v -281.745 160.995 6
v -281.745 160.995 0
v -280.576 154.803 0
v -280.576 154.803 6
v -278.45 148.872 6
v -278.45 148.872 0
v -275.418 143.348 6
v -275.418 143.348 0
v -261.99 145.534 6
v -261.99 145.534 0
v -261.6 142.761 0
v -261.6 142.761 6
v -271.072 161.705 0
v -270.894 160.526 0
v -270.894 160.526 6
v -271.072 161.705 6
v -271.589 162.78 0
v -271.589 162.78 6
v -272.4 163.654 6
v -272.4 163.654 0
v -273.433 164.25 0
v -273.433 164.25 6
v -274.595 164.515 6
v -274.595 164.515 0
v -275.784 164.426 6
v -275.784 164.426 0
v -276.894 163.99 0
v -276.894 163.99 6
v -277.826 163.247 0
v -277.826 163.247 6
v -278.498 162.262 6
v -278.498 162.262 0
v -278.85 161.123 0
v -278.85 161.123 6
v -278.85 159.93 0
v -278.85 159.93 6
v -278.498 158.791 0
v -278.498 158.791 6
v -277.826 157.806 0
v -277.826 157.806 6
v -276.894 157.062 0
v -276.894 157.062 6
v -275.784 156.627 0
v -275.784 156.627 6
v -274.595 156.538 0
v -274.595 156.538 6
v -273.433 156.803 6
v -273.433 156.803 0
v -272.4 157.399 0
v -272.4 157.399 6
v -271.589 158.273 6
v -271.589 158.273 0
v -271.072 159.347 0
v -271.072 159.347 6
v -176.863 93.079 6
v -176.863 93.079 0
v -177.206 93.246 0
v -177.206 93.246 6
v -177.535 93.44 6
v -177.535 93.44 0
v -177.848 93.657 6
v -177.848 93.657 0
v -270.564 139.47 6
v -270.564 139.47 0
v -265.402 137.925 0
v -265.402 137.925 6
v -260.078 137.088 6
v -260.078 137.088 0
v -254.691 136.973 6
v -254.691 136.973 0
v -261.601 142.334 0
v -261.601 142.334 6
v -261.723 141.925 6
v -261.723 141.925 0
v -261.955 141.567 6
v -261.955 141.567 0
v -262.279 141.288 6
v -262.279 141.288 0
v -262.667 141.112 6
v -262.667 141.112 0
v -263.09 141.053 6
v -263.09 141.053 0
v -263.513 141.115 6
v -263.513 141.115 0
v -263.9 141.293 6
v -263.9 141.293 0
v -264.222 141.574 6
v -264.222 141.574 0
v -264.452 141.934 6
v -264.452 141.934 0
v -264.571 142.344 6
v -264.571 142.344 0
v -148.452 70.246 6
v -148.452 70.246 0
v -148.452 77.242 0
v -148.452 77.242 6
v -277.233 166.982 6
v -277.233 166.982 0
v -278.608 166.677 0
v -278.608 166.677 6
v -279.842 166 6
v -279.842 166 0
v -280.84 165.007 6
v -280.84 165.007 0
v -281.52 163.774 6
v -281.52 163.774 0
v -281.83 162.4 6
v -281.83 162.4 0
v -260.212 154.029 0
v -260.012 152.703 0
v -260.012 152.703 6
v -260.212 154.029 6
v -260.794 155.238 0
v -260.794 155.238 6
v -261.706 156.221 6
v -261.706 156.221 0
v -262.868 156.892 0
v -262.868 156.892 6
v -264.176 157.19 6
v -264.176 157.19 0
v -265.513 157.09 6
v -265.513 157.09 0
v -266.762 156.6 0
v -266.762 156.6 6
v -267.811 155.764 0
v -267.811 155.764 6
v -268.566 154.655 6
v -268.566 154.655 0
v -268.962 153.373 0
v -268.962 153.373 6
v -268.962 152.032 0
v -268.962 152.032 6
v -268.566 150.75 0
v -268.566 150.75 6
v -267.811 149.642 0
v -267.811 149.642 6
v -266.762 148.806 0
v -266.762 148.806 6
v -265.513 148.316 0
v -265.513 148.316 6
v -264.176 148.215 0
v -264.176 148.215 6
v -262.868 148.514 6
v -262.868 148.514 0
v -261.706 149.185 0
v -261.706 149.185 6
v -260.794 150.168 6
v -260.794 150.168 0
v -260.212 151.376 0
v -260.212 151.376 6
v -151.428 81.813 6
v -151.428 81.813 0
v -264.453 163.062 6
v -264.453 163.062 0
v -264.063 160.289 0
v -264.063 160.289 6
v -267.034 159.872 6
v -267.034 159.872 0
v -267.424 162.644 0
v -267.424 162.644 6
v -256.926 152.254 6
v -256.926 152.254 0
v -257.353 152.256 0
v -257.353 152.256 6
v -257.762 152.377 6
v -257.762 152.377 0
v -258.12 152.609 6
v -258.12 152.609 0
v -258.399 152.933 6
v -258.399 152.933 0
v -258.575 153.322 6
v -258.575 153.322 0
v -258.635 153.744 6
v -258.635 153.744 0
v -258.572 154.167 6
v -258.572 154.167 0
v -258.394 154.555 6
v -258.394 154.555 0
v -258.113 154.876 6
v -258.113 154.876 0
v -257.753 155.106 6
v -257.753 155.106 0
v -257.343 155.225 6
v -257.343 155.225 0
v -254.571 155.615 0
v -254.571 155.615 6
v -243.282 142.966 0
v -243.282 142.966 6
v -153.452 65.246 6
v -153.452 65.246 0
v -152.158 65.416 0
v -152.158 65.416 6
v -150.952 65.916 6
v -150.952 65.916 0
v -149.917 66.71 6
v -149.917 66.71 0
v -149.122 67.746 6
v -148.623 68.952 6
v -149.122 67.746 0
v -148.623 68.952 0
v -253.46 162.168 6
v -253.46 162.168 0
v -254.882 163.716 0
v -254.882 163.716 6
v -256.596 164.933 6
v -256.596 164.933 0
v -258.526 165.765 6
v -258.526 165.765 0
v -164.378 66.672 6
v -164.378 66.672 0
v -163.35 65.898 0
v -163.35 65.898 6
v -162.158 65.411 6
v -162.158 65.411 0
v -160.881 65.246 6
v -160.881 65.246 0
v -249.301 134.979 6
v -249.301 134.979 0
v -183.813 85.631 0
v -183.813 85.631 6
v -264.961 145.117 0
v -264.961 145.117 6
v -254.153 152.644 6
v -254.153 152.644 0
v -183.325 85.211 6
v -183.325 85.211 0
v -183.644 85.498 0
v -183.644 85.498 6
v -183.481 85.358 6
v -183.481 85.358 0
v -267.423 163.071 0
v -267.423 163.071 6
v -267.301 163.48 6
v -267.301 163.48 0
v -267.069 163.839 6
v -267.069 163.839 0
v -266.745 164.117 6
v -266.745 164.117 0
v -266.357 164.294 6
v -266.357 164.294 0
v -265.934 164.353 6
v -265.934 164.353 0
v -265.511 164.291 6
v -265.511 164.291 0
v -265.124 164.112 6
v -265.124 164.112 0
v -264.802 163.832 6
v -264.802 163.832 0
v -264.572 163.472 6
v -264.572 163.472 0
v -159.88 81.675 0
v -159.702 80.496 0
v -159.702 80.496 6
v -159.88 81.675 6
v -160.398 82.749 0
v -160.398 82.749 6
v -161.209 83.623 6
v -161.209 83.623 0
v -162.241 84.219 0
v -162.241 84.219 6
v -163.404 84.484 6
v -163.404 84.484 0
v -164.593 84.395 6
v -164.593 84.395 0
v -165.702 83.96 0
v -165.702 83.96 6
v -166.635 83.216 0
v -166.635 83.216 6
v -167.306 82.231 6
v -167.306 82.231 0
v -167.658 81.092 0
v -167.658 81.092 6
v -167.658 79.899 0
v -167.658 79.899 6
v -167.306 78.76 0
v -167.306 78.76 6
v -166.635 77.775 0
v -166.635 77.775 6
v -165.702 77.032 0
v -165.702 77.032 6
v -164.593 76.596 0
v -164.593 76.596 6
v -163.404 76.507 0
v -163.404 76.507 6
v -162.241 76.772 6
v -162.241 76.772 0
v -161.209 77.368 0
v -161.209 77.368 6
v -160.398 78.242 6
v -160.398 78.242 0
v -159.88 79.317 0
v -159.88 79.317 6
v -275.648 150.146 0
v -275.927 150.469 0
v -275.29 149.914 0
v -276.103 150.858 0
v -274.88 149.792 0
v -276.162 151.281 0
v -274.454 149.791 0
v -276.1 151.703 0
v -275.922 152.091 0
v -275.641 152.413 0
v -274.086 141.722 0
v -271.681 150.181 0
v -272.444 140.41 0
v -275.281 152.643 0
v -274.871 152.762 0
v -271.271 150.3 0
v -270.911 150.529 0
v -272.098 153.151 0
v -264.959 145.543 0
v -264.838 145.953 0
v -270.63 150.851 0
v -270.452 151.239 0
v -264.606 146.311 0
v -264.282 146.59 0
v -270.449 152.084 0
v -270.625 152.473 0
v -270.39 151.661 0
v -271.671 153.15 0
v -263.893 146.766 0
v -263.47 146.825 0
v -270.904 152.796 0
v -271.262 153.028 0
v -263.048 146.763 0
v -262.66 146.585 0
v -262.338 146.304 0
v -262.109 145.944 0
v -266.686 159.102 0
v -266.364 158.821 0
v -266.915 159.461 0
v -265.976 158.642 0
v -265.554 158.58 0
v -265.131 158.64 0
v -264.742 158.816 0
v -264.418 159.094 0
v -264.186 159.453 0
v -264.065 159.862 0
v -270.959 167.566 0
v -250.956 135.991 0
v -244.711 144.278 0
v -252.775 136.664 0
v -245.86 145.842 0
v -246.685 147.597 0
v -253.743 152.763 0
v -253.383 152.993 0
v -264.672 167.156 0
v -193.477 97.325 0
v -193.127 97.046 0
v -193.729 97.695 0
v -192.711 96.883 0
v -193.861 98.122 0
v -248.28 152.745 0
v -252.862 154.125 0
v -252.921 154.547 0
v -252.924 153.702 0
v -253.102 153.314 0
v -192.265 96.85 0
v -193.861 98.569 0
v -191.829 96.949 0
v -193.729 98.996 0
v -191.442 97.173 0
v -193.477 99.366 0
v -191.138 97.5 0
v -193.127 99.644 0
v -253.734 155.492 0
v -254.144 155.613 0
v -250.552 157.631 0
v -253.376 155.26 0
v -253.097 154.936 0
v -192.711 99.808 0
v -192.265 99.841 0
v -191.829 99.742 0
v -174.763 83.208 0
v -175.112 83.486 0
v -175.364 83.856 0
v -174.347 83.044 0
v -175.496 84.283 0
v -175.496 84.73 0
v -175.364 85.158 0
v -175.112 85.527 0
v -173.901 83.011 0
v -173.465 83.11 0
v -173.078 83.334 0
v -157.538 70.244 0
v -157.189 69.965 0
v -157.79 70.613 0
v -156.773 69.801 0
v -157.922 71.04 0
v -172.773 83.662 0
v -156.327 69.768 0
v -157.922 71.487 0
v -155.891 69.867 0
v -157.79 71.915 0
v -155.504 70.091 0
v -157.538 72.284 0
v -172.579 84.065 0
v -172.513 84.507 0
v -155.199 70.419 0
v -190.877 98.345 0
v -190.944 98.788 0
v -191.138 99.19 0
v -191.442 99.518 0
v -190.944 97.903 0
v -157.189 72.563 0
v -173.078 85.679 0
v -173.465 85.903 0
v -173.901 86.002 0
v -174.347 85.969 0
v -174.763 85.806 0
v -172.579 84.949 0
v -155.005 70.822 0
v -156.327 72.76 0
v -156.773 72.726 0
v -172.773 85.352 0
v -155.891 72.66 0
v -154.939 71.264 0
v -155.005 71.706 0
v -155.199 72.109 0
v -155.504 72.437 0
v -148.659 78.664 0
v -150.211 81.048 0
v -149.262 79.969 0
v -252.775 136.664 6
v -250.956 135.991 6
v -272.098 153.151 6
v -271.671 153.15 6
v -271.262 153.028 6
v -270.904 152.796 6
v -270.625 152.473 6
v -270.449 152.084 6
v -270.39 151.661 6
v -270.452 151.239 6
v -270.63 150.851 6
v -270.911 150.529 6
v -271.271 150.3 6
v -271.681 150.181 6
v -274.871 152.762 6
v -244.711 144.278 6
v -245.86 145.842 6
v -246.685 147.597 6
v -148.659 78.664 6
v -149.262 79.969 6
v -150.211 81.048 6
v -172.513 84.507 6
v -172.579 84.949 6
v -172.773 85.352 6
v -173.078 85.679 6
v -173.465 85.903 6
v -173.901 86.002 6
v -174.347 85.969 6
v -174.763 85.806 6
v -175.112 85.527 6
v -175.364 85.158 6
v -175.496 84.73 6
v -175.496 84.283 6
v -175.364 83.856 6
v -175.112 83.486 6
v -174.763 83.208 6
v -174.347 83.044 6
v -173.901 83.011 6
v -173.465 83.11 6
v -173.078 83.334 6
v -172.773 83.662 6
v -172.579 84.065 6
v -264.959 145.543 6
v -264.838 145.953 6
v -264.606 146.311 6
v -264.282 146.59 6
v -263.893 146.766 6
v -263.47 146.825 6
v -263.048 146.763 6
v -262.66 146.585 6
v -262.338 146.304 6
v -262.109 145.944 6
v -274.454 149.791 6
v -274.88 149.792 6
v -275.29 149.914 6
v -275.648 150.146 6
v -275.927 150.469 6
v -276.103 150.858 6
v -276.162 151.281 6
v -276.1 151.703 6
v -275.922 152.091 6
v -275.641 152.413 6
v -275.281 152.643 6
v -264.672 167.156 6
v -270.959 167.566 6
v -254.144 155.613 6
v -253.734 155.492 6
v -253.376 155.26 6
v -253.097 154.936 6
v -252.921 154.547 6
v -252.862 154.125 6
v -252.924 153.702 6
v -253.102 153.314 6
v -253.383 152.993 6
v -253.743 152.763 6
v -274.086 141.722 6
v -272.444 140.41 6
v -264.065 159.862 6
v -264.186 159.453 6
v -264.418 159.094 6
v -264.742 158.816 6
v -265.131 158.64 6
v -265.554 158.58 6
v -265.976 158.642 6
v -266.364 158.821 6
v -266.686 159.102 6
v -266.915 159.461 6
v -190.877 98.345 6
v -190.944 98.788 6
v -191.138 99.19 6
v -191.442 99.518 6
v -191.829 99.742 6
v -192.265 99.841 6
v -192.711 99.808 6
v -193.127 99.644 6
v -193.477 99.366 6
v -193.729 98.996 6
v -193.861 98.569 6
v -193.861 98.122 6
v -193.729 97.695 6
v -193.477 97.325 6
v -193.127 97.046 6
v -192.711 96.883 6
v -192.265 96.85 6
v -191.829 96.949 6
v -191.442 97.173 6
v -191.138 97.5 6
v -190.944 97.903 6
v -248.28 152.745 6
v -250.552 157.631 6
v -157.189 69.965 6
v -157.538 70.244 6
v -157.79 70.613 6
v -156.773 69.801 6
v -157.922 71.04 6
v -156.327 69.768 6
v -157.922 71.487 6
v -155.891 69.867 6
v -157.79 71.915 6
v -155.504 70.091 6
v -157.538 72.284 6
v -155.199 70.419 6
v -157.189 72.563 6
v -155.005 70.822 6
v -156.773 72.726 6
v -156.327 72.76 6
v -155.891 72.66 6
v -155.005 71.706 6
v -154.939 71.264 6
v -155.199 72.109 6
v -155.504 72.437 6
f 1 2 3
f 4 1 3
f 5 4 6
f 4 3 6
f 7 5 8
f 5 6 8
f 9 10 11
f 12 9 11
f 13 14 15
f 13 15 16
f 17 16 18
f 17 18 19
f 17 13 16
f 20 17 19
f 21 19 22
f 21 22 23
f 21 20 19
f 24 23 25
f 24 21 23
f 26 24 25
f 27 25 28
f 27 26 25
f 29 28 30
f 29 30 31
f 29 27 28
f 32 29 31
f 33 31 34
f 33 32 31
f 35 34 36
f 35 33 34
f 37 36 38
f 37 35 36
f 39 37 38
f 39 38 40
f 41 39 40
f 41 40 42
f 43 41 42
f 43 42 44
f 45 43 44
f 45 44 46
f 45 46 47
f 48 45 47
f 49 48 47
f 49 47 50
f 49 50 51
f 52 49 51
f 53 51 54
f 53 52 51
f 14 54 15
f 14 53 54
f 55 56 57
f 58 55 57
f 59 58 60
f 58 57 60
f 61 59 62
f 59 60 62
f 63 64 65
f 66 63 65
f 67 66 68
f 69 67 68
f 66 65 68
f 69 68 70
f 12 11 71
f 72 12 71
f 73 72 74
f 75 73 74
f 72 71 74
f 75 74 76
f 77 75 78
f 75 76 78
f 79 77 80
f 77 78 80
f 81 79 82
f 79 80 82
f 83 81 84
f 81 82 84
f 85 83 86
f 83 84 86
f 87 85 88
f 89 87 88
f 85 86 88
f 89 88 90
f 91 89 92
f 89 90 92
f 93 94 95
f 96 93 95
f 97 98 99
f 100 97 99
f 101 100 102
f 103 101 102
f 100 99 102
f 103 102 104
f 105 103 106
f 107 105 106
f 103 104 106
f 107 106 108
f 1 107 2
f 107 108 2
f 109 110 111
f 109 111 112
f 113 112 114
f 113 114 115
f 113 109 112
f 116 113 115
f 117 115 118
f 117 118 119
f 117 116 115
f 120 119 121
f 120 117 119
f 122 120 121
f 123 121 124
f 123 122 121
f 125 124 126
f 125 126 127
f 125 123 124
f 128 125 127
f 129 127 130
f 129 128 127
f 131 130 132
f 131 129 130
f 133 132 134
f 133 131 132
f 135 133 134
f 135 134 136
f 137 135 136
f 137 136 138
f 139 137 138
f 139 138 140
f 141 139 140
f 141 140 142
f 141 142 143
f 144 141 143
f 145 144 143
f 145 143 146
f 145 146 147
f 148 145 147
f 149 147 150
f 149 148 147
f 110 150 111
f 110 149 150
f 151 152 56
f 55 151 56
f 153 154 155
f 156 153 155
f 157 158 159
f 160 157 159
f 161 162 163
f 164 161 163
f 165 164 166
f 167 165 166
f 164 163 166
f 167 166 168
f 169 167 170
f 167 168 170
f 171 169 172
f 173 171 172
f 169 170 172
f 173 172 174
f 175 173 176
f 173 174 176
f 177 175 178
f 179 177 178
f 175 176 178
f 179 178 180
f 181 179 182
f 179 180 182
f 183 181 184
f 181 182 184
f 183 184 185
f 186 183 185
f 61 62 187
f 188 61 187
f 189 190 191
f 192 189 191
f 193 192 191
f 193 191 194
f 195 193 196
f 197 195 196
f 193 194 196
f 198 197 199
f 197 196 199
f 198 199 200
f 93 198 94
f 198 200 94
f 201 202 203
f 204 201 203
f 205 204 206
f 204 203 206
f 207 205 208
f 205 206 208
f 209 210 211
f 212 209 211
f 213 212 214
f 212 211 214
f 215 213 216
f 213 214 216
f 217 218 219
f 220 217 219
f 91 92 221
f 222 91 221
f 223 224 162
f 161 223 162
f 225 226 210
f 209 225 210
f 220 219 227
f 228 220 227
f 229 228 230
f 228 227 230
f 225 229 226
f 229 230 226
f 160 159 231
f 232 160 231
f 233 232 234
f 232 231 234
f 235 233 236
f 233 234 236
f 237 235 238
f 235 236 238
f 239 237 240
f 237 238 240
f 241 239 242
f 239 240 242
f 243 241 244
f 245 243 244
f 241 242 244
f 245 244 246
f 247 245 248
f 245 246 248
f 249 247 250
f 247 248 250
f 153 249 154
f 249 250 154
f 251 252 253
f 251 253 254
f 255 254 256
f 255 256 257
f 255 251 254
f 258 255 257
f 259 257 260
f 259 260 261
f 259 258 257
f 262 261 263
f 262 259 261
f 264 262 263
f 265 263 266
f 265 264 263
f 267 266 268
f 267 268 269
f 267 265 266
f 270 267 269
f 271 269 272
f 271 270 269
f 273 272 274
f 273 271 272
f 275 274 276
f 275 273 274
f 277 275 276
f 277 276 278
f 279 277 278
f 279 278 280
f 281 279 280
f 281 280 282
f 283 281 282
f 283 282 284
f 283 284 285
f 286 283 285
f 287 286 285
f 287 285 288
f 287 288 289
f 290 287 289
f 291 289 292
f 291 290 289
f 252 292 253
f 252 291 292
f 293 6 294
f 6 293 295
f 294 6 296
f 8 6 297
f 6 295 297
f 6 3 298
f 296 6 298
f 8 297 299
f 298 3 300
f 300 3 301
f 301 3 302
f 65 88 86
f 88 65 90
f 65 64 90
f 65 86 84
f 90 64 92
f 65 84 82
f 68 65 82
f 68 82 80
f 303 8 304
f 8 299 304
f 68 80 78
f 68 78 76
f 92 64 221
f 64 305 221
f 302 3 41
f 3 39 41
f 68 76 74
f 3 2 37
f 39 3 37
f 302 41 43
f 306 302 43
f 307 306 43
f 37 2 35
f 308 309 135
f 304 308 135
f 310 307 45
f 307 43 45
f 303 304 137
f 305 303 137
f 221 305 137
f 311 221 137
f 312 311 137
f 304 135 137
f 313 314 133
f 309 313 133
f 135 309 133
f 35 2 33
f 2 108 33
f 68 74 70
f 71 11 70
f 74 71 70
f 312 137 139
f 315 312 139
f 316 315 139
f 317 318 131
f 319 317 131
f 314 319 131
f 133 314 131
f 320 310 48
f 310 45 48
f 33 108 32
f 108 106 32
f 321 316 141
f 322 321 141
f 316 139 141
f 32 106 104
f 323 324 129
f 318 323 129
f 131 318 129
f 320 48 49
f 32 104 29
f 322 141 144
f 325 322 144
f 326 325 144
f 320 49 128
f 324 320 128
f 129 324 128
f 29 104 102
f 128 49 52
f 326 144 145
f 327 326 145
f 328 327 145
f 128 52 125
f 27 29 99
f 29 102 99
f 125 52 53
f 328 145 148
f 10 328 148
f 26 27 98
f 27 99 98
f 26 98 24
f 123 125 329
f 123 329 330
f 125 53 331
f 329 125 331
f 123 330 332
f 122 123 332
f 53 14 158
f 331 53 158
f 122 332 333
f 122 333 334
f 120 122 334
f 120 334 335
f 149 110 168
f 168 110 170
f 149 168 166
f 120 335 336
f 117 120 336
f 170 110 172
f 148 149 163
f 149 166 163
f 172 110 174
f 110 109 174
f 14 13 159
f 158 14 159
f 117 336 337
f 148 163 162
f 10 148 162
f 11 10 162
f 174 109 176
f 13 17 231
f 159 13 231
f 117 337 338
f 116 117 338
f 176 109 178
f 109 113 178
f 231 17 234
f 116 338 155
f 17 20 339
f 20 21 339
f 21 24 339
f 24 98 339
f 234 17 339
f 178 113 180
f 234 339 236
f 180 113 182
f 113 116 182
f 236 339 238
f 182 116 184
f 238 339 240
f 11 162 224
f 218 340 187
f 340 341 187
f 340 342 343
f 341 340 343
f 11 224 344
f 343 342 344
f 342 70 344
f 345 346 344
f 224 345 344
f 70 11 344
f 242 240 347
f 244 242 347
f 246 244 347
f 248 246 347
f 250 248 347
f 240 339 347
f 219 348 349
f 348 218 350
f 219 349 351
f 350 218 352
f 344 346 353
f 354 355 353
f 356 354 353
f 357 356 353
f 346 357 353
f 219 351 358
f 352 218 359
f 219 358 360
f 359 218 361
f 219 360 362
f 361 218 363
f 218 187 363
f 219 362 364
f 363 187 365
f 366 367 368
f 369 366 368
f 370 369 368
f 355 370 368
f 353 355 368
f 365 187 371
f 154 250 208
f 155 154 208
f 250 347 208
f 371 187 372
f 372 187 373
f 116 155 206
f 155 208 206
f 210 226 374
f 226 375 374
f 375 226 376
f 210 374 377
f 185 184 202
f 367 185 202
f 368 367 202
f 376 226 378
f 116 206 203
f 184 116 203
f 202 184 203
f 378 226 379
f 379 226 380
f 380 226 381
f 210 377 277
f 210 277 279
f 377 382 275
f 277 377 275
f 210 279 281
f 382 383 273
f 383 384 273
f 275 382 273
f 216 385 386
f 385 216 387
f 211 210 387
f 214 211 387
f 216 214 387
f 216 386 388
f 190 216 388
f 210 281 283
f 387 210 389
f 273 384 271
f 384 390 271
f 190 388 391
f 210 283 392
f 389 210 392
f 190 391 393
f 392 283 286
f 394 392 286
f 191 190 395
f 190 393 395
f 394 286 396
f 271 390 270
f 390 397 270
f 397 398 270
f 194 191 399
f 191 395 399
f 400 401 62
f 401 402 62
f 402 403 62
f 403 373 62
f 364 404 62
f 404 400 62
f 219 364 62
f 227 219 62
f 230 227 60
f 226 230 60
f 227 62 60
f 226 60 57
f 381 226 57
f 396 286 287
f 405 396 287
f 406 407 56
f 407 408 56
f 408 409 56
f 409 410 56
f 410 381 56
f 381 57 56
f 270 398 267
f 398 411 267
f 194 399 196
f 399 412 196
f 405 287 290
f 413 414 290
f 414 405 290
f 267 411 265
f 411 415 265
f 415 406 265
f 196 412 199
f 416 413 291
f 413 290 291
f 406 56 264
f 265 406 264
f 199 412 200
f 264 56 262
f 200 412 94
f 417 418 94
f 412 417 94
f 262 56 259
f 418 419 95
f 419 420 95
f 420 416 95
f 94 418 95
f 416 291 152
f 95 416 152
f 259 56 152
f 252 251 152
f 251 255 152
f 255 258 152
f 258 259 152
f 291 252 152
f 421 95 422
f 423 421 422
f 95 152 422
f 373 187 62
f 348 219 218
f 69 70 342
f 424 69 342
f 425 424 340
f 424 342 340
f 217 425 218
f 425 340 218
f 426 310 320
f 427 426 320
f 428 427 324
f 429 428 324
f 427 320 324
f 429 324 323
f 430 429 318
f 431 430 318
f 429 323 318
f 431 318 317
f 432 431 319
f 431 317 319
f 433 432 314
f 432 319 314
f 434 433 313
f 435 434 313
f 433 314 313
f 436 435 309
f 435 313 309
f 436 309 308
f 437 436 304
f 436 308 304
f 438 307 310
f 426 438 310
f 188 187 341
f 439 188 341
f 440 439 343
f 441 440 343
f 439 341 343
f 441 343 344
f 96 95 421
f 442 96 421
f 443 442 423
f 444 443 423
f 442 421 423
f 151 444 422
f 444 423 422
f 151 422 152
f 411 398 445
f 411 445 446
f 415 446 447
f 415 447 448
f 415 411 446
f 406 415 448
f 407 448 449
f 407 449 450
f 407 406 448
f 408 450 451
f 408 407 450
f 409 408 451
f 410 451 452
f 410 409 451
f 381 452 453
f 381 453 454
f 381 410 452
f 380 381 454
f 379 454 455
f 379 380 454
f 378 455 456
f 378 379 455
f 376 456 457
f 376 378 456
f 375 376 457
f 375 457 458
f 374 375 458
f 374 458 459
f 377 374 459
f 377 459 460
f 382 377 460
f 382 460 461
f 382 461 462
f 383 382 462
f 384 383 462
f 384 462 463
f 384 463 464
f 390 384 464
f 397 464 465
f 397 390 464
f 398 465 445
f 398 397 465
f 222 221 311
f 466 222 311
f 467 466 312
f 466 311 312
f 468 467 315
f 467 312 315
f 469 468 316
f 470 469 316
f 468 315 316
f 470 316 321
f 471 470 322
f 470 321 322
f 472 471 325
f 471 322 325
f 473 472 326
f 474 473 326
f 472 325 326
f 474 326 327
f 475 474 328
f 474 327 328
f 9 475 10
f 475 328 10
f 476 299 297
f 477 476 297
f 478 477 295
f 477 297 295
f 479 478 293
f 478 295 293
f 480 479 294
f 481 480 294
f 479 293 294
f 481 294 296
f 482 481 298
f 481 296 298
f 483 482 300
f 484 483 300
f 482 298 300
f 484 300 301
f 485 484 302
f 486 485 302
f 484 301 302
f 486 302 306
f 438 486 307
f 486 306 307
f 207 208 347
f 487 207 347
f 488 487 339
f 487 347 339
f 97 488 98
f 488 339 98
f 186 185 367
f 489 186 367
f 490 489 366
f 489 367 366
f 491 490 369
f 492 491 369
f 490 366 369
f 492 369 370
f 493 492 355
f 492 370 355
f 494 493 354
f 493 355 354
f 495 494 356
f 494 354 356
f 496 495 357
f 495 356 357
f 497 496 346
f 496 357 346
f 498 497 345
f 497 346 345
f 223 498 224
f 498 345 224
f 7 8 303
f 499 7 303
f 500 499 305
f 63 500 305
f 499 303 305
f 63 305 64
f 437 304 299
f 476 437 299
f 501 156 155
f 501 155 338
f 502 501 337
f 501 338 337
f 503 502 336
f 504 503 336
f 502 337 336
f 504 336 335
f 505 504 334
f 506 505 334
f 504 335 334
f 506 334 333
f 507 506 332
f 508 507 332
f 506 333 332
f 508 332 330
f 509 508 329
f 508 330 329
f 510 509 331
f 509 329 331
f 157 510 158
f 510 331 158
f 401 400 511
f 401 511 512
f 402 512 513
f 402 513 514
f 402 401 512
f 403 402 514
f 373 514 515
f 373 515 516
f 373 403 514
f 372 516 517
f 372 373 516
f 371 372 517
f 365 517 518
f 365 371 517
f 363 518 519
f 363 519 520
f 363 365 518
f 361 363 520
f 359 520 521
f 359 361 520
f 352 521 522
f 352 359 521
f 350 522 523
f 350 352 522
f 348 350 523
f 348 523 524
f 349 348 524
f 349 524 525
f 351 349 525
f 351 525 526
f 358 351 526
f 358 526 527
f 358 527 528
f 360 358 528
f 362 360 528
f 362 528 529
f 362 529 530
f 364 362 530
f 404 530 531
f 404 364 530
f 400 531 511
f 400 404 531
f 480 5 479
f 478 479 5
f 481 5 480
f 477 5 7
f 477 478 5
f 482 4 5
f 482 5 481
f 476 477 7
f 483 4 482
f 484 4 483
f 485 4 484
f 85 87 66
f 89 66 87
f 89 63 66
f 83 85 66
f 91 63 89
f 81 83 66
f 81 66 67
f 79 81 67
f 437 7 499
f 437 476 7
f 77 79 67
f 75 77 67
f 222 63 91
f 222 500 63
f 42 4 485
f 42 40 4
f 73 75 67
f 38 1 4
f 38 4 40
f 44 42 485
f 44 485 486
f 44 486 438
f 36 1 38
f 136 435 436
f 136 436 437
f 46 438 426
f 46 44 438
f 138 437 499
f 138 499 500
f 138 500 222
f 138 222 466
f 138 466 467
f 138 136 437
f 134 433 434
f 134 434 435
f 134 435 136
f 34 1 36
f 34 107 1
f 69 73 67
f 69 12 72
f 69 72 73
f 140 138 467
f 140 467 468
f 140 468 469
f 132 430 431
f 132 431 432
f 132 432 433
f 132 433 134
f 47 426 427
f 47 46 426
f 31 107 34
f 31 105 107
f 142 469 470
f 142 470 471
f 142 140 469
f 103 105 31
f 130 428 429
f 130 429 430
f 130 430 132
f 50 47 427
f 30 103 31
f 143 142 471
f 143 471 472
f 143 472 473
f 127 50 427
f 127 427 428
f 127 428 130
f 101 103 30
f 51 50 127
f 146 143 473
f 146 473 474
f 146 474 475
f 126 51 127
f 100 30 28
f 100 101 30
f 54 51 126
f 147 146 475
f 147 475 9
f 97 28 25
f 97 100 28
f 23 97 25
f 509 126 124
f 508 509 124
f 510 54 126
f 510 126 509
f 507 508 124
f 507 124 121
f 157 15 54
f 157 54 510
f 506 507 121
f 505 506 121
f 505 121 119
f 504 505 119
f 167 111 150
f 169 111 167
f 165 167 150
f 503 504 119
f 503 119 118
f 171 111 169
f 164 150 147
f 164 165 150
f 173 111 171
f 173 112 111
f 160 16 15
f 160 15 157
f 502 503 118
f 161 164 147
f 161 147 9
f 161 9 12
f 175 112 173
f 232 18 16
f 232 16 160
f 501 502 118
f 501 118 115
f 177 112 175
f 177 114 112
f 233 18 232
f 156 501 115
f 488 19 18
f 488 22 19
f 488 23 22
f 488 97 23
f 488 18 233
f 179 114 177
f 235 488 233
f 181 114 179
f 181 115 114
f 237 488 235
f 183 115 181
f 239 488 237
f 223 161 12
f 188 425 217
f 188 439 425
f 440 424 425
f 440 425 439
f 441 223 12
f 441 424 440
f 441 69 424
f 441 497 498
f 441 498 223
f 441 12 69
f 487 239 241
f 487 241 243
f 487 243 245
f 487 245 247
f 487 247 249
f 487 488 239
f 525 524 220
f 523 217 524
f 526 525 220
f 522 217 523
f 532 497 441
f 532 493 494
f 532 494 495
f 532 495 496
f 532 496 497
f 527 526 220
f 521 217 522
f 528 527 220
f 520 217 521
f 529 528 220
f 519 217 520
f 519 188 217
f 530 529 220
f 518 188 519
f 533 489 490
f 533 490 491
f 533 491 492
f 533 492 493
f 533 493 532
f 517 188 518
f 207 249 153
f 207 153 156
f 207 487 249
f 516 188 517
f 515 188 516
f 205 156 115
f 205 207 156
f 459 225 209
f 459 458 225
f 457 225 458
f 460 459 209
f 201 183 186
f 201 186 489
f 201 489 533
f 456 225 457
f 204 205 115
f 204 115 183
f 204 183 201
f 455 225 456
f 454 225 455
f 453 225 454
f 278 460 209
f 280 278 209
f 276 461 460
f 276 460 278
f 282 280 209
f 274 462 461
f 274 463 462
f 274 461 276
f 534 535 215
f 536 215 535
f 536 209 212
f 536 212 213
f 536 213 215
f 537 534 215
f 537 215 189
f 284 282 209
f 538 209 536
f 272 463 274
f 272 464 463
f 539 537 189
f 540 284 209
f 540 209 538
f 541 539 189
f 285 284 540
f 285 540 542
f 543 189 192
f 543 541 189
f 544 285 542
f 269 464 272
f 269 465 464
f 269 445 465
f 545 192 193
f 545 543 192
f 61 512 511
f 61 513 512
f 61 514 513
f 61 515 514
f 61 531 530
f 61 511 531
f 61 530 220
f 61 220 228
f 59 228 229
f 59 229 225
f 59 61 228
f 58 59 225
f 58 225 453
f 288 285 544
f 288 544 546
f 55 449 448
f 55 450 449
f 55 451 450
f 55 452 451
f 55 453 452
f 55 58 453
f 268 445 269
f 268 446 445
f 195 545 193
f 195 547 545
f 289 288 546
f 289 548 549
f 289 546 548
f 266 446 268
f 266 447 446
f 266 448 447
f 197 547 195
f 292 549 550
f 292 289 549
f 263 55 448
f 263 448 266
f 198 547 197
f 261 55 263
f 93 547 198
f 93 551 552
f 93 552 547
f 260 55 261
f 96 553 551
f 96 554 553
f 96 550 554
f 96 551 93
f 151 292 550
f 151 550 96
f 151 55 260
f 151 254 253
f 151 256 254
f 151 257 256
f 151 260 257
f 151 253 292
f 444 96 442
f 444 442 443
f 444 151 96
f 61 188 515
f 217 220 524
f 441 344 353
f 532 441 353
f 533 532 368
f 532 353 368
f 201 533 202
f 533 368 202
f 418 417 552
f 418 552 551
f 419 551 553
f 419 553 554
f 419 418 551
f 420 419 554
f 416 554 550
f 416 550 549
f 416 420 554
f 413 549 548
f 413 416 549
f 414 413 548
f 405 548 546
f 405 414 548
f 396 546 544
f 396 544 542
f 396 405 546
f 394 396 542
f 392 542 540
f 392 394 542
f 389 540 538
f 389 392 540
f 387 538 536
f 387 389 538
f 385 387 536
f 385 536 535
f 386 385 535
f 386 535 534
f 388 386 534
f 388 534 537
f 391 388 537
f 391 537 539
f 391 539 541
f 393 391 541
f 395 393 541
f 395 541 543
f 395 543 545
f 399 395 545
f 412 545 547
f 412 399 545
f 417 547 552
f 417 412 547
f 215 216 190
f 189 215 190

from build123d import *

# Parameters (mm, degrees)
CROQUIS1_R              = 1.5
CROQUIS1_R_2            = 4
CROQUIS1_R_3            = 4.5
SALIENTE_EXTRUIR1_DEPTH = 6


with BuildPart() as part:
    # Croquis1 → Saliente-Extruir1 (new body)
    with BuildSketch(Plane.XY):
        with BuildLine():
            ThreePointArc((-153.452479084, 65.245629882), (-149.916945178, 66.710095976), (-148.452479084, 70.245629882))
            Line((-148.452479084, 70.245629882), (-148.452479084, 77.241660705))
            ThreePointArc((-148.452479084, 77.241660705), (-149.261781775, 79.96894068), (-151.427701509, 81.813342646))
            Line((-151.427701509, 81.813342646), (-176.86343393, 93.078715272))
            ThreePointArc((-176.86343393, 93.078715272), (-177.372149016, 93.339780675), (-177.847731471, 93.657219664))
            Line((-177.847731471, 93.657219663), (-243.282498112, 142.965853083))
            ThreePointArc((-243.282498112, 142.965853083), (-245.323514753, 145.031918552), (-246.684791002, 147.597323475))
            ThreePointArc((-246.684791002, 147.597323475), (-249.33333249, 155.226277836), (-253.46024382, 162.167770437))
            ThreePointArc((-253.46024382, 162.167770437), (-255.706791789, 164.36963499), (-258.526200935, 165.764668091))
            ThreePointArc((-258.526200935, 165.764668091), (-267.807267276, 167.484933762), (-277.233031605, 166.98246665))
            ThreePointArc((-277.233031605, 166.98246665), (-280.839635864, 165.006508056), (-281.744934312, 160.994969527))
            ThreePointArc((-281.744934312, 160.994969527), (-279.629843944, 151.795844616), (-275.418009863, 143.348480526))
            ThreePointArc((-275.418009863, 143.348480526), (-273.299883496, 141.022813744), (-270.564082899, 139.470209357))
            ThreePointArc((-270.564082899, 139.470209357), (-262.753961023, 137.416502238), (-254.690502443, 136.973385563))
            ThreePointArc((-254.690502443, 136.973385563), (-251.84925837, 136.371964278), (-249.300648344, 134.979497983))
            Line((-249.300648344, 134.979497983), (-183.81253652, 85.630666085))
            ThreePointArc((-183.81253652, 85.630666085), (-183.561856018, 85.428793496), (-183.324683063, 85.211210762))
            Line((-183.324683063, 85.211210762), (-164.378251009, 66.671907655))
            ThreePointArc((-164.378251009, 66.671907655), (-162.769627082, 65.615910067), (-160.881322437, 65.245629882))
            Line((-160.881322437, 65.245629882), (-153.452479084, 65.245629882))
        make_face()
        with Locations((-156.438834184, 71.263780114)):
            Circle(CROQUIS1_R, mode=Mode.SUBTRACT)
        with Locations((-174.012762489, 84.506684964)):
            Circle(CROQUIS1_R, mode=Mode.SUBTRACT)
        with Locations((-163.702479084, 80.495629882)):
            Circle(CROQUIS1_R_2, mode=Mode.SUBTRACT)
        with Locations((-192.377432136, 98.345456156)):
            Circle(CROQUIS1_R, mode=Mode.SUBTRACT)
        with BuildLine():
            Line((-271.680758131, 150.180525793), (-274.453508724, 149.79084111))
            ThreePointArc((-274.453508724, 149.79084111), (-276.147670478, 151.067483562), (-274.871028026, 152.761645316))
            Line((-274.871028026, 152.761645316), (-272.098277434, 153.151329999))
            ThreePointArc((-272.098277434, 153.151329999), (-270.404115679, 151.874687547), (-271.680758131, 150.180525793))
        make_face(mode=Mode.SUBTRACT)
        with BuildLine():
            Line((-261.989778965, 145.534030037), (-261.600094282, 142.761279445))
            ThreePointArc((-261.600094282, 142.761279445), (-262.876736734, 141.06711769), (-264.570898489, 142.343760142))
            Line((-264.570898489, 142.343760142), (-264.960583171, 145.116510734))
            ThreePointArc((-264.960583171, 145.116510734), (-263.68394072, 146.810672489), (-261.989778965, 145.534030037))
        make_face(mode=Mode.SUBTRACT)
        with Locations((-264.51202067, 152.702767498)):
            Circle(CROQUIS1_R_3, mode=Mode.SUBTRACT)
        with BuildLine():
            Line((-257.34328321, 155.225009203), (-254.570532617, 155.614693886))
            ThreePointArc((-254.570532617, 155.614693886), (-252.876370863, 154.338051434), (-254.153013314, 152.64388968))
            Line((-254.153013314, 152.64388968), (-256.925763907, 152.254204997))
            ThreePointArc((-256.925763907, 152.254204997), (-258.619925661, 153.530847449), (-257.34328321, 155.225009203))
        make_face(mode=Mode.SUBTRACT)
        with Locations((-274.894282301, 160.526362799)):
            Circle(CROQUIS1_R_2, mode=Mode.SUBTRACT)
        with BuildLine():
            Line((-267.034262376, 159.871504959), (-267.423947058, 162.644255551))
            ThreePointArc((-267.423947058, 162.644255551), (-266.147304607, 164.338417306), (-264.453142852, 163.061774854))
            Line((-264.453142852, 163.061774854), (-264.063458169, 160.289024262))
            ThreePointArc((-264.063458169, 160.289024262), (-265.340100621, 158.594862507), (-267.034262376, 159.871504959))
        make_face(mode=Mode.SUBTRACT)
    extrude(amount=SALIENTE_EXTRUIR1_DEPTH)


solid = part.part
